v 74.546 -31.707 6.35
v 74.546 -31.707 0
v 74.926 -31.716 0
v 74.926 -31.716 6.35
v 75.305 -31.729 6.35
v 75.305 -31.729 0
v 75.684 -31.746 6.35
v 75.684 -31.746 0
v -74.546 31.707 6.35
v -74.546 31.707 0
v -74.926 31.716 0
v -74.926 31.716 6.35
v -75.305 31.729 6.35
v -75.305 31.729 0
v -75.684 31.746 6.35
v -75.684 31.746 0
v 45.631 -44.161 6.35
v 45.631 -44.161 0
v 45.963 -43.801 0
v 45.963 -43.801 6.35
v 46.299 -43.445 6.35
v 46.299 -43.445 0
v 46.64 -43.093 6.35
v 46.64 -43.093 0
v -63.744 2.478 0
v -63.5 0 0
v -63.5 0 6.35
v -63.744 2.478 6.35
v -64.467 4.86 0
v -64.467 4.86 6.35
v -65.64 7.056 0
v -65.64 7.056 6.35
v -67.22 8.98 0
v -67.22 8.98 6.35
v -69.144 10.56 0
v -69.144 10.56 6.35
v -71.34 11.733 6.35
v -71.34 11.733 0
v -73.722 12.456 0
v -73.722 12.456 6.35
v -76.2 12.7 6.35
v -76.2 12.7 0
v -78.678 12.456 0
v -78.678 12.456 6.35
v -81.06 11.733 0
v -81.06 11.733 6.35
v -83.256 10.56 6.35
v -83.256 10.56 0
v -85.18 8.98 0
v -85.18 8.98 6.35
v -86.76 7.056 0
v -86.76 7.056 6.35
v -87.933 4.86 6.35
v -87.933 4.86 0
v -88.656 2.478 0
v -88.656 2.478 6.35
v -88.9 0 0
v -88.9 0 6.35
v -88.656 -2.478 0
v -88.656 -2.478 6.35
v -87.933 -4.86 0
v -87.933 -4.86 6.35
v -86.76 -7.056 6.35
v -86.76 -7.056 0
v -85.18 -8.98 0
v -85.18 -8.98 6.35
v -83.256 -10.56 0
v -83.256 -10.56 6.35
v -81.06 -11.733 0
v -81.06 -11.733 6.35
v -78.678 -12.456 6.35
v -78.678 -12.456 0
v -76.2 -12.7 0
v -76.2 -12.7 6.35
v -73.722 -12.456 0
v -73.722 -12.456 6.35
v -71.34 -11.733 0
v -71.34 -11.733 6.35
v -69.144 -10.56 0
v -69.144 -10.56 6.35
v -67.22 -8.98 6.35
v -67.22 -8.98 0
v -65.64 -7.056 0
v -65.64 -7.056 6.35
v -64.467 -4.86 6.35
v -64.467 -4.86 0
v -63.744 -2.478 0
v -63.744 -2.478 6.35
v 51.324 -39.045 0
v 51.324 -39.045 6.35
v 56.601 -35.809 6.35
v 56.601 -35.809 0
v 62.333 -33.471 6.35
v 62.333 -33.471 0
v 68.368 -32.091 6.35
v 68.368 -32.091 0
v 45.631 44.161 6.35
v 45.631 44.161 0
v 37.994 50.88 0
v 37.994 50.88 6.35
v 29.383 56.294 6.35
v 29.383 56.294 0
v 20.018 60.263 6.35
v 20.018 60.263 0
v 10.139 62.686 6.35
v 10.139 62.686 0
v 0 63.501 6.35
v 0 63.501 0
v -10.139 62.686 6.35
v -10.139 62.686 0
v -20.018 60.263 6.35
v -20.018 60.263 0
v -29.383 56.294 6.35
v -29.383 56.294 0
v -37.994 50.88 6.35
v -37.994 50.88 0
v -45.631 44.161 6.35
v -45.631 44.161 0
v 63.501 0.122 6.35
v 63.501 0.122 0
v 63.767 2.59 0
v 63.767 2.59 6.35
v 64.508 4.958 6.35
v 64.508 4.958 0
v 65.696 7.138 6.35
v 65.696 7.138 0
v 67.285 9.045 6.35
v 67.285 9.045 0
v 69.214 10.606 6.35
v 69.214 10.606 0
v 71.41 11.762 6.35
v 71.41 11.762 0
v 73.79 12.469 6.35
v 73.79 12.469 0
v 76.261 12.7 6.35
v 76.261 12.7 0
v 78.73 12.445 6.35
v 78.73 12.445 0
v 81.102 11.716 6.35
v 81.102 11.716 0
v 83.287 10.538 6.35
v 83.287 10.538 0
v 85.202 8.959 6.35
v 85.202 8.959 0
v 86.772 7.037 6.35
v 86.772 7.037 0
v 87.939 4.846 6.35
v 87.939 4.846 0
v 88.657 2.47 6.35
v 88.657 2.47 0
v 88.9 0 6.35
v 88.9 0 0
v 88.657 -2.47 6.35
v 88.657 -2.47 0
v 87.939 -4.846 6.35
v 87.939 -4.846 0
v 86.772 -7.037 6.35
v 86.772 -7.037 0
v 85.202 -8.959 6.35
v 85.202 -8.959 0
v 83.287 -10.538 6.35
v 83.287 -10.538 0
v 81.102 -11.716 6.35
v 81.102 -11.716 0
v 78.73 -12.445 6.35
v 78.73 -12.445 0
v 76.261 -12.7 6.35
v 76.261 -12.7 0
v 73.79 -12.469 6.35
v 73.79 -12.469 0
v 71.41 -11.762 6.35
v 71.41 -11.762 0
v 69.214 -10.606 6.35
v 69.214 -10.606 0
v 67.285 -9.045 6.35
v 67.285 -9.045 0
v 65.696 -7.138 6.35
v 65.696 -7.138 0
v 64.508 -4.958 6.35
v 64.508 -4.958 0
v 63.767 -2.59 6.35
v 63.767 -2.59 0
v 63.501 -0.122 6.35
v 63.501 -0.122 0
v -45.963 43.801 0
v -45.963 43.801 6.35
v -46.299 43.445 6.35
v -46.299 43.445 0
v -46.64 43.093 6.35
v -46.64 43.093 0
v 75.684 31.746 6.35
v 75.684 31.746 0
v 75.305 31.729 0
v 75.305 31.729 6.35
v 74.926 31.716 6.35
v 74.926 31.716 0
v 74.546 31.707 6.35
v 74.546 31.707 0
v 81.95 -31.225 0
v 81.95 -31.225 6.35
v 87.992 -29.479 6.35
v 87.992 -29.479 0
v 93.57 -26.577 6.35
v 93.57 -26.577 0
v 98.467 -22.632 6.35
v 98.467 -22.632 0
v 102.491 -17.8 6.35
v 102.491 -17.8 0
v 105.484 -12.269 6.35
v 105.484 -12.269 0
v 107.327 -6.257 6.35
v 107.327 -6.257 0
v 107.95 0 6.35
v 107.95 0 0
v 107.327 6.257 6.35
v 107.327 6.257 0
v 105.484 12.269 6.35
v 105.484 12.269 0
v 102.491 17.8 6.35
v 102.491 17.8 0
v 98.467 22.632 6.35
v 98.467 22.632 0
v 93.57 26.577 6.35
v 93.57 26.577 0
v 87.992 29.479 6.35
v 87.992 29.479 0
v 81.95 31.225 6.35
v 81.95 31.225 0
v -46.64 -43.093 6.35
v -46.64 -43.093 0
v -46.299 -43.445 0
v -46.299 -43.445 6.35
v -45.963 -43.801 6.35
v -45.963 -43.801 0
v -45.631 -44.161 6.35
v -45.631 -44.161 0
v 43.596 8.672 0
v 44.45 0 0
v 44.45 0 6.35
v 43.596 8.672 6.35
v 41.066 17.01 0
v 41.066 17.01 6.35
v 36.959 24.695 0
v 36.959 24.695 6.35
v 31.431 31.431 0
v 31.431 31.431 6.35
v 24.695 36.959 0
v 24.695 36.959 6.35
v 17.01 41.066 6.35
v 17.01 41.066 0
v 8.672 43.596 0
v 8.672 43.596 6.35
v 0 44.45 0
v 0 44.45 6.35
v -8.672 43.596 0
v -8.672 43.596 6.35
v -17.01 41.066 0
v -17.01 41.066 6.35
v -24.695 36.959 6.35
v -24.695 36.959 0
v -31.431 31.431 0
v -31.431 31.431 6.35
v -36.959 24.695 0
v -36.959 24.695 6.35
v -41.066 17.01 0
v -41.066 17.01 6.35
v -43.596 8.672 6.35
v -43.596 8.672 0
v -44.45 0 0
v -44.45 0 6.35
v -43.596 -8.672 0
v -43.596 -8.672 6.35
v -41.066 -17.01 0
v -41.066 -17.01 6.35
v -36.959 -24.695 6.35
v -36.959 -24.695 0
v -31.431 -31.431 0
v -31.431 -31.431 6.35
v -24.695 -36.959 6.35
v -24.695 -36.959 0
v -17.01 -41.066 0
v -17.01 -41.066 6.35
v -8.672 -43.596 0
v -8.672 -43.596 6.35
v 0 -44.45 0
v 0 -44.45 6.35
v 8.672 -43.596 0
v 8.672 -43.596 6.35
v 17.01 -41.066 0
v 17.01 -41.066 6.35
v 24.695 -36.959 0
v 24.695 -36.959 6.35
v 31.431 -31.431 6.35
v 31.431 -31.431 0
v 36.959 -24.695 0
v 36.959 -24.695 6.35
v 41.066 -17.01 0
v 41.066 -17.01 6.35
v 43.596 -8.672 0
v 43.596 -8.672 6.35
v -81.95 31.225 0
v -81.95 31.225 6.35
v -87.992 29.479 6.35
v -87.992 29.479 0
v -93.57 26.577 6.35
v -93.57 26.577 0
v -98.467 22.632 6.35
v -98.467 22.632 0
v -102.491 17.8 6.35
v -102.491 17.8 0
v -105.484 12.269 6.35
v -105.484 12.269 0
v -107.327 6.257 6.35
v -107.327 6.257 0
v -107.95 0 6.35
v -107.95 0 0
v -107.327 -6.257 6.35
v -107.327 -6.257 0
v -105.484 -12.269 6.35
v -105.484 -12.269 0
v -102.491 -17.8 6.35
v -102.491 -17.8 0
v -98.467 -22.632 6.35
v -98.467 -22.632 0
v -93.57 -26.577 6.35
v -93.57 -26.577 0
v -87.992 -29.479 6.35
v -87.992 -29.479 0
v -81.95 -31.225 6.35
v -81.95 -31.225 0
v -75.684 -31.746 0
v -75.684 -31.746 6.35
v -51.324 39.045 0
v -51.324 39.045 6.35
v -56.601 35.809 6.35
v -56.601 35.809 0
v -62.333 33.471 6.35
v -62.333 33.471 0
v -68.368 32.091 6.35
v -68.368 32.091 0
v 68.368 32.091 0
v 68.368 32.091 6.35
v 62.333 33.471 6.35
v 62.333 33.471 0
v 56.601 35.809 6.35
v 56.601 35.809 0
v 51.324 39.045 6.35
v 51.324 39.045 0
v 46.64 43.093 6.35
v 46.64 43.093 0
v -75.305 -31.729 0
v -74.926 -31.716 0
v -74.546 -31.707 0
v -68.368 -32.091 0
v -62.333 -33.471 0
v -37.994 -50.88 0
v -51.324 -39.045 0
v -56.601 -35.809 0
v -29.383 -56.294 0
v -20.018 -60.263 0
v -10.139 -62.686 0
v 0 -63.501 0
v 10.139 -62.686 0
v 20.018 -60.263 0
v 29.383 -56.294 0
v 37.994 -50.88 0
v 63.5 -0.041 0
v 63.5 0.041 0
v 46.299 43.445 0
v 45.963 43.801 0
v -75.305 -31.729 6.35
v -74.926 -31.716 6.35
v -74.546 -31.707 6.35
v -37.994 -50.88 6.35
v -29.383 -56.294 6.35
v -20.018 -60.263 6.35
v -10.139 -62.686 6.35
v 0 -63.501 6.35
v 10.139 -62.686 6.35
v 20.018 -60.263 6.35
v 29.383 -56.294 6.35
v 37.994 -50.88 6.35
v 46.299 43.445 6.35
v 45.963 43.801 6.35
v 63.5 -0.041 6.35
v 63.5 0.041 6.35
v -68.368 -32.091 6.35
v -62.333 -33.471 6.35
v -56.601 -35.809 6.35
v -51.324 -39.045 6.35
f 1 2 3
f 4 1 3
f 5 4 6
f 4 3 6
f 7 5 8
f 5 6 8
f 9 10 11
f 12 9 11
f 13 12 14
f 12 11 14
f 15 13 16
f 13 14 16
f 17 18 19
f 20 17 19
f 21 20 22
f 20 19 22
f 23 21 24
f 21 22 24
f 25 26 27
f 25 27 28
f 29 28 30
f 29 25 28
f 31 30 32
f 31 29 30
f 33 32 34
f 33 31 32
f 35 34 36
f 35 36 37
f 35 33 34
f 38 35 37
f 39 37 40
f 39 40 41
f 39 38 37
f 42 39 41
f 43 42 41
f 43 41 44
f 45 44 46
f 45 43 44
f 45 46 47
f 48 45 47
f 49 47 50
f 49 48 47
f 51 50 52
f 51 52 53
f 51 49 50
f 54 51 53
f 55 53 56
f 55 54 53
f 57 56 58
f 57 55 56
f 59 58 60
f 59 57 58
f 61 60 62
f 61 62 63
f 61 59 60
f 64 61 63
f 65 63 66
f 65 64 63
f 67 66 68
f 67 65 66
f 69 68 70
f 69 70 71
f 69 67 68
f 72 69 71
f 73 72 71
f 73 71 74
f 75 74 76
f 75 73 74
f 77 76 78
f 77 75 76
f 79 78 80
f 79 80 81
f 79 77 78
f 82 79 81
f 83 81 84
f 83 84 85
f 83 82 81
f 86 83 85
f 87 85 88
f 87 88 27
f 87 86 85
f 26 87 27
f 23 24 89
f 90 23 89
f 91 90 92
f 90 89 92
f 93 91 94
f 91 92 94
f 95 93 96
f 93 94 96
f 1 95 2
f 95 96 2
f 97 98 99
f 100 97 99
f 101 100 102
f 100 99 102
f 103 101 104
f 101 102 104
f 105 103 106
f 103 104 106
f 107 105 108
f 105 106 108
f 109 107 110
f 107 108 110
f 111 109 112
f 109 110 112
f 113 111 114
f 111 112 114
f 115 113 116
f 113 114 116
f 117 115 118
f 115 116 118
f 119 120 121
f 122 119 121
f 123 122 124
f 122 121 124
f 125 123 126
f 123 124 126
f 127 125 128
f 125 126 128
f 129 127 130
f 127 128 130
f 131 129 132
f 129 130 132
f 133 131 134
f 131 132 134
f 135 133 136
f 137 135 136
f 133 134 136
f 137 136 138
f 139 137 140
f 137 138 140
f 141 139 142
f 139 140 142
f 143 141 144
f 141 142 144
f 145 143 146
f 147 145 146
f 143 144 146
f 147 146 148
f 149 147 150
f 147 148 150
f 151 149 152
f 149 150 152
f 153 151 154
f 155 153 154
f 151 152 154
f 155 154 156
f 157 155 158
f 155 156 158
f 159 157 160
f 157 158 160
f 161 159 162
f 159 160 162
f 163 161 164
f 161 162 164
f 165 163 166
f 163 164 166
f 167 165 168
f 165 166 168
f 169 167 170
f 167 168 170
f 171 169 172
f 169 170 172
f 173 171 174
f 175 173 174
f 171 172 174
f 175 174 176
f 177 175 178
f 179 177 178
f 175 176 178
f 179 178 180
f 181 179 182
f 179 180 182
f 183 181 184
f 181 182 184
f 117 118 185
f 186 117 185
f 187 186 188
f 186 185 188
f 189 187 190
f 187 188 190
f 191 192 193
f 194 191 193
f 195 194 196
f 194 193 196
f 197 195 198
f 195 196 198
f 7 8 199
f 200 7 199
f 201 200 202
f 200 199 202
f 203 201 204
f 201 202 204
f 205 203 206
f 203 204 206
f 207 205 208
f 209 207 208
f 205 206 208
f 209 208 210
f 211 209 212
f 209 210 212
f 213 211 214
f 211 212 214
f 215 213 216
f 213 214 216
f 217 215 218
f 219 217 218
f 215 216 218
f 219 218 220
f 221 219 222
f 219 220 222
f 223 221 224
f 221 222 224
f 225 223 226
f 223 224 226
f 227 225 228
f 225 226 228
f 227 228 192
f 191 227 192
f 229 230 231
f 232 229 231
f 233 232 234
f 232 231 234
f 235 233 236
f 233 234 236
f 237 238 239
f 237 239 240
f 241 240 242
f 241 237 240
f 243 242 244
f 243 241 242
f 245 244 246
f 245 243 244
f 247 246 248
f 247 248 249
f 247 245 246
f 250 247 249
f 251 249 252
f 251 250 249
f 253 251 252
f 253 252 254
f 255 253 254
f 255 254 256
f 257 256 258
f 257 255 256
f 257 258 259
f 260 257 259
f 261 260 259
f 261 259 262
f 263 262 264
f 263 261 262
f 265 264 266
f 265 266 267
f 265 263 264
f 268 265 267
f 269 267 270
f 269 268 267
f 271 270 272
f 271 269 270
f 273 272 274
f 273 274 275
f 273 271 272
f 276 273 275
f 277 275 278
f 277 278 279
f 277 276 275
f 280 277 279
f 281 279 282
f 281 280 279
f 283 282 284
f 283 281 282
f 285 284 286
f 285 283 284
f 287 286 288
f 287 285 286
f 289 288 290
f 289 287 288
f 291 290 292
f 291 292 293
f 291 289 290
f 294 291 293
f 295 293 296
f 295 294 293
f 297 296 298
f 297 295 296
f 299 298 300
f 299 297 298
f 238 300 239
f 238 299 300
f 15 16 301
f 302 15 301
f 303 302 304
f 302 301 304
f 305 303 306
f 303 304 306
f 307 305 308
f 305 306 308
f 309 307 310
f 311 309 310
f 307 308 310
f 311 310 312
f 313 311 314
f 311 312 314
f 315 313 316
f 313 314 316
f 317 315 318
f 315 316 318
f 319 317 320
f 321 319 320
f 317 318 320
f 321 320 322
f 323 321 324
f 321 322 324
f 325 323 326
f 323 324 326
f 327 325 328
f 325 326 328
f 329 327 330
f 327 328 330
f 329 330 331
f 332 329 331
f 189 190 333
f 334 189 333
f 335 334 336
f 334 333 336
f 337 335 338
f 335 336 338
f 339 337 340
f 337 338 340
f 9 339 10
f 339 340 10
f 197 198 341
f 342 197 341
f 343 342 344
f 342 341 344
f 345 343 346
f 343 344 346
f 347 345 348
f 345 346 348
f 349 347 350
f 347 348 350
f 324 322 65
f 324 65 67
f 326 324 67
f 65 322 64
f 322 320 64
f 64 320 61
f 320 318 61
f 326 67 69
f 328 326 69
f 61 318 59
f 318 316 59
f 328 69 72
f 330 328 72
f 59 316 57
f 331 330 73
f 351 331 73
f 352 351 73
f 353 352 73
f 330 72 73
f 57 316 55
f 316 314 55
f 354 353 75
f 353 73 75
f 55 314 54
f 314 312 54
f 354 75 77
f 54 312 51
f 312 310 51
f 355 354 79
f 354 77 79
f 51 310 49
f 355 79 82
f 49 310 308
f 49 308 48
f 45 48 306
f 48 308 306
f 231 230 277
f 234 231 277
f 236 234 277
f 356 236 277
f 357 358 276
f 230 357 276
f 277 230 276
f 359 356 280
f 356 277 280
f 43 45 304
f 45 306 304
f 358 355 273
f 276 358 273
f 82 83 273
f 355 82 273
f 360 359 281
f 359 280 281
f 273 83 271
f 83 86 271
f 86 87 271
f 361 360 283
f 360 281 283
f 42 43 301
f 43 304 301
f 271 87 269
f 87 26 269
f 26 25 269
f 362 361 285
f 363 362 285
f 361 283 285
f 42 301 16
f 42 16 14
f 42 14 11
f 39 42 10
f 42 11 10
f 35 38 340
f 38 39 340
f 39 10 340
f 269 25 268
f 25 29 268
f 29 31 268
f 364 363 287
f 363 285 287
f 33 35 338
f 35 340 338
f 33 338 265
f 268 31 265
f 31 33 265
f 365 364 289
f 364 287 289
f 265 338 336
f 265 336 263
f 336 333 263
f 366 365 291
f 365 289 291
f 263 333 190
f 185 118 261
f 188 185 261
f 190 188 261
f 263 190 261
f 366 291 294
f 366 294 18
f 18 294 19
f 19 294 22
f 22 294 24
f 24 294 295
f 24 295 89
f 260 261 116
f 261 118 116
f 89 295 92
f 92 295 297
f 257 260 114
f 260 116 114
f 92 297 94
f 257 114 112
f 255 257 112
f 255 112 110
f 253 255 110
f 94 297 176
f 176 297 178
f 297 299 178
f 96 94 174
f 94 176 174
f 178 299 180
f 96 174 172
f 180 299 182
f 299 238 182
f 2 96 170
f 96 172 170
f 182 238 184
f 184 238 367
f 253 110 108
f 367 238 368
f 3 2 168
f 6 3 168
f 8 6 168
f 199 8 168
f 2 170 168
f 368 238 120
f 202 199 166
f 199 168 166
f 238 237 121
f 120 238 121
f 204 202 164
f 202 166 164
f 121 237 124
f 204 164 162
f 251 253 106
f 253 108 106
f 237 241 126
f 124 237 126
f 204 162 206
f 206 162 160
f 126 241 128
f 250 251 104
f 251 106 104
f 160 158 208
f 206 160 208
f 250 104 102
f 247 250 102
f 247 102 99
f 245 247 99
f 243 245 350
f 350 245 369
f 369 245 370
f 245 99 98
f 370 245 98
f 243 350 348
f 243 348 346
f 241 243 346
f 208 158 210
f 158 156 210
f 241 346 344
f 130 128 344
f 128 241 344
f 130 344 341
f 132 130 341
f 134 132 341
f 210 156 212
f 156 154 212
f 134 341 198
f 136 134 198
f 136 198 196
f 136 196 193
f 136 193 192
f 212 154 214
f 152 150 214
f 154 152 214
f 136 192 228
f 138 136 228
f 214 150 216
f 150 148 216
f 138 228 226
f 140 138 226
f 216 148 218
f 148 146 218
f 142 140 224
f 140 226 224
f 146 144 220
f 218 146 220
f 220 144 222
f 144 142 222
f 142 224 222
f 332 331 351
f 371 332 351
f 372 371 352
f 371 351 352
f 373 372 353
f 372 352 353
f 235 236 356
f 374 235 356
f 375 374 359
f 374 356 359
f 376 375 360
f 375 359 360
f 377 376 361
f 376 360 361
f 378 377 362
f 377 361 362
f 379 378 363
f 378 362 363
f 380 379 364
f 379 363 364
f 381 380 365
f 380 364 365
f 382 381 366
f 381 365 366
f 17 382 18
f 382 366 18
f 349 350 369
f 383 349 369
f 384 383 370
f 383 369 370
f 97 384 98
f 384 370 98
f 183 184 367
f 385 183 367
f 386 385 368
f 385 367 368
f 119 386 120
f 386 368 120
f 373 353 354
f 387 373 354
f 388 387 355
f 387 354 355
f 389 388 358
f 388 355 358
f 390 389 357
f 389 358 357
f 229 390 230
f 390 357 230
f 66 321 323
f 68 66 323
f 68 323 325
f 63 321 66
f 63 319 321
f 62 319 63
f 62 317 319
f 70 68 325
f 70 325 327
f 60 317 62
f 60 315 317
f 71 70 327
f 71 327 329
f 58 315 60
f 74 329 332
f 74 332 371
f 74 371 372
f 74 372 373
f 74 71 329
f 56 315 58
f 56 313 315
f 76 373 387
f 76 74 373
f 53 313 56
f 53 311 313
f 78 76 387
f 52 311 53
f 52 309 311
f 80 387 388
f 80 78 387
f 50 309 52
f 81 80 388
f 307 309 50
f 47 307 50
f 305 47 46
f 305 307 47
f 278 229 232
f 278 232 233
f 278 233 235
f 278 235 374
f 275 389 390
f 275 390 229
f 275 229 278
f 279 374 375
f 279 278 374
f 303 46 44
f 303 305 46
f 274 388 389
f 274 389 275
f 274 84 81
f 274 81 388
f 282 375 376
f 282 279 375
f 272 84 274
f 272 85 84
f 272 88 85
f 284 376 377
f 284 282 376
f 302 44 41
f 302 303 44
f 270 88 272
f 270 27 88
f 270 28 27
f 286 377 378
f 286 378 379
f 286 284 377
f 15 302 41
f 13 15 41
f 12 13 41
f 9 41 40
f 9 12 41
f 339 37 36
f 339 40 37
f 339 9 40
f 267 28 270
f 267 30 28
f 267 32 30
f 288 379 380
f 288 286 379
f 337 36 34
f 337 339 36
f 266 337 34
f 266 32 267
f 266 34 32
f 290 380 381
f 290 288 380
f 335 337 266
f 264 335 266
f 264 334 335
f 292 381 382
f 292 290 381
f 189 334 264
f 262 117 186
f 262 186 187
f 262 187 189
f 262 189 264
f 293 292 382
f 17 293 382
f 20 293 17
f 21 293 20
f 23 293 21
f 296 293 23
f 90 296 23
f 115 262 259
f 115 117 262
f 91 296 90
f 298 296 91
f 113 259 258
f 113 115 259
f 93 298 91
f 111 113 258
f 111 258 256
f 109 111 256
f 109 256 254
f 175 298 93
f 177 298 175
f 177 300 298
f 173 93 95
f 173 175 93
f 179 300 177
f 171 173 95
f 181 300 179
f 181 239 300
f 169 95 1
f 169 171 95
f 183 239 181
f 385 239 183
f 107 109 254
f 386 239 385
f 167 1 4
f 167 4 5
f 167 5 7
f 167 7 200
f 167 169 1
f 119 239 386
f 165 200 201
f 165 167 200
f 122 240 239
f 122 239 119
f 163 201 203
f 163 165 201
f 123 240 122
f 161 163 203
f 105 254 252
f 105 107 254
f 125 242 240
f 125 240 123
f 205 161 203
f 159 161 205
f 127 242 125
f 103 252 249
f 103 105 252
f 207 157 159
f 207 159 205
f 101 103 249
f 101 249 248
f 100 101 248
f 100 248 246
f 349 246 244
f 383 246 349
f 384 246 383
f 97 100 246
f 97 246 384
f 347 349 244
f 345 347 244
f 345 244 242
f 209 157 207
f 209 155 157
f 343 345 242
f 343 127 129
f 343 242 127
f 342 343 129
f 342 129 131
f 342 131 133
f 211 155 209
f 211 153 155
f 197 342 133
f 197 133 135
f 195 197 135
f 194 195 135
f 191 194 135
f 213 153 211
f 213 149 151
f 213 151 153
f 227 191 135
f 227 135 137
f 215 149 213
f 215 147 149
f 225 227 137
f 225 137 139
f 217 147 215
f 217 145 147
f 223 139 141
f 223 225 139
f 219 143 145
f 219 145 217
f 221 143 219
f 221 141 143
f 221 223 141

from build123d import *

# Parameters (mm, degrees)
F0_R     = 12.7
F0_R_2   = 44.45
F1_DEPTH = 6.35


# Not quite as in the source:
# - a length typed as a fraction of an inch, garbled in the dataset ("3 / 203.2 mm" for 3/8 in), is restored


with BuildPart() as f1:
    # F0 (on Top) → F1 (new body)
    with BuildSketch(Plane.XY):
        with BuildLine():
            ThreePointArc((-74.5464027897, -31.7069095982), (-59.4196204119, -34.5232781397), (-46.6403597532, -43.0931074194))
            ThreePointArc((-46.6403597532, -43.0931074194), (-46.1303112619, -43.6221670242), (-45.6305618227, -44.160965713))
            ThreePointArc((-45.6305618227, -44.160965713), (0, -63.500701295), (45.6305618227, -44.160965713))
            ThreePointArc((45.6305618227, -44.160965713), (46.1303112619, -43.6221670242), (46.6403597532, -43.0931074194))
            ThreePointArc((46.6403597532, -43.0931074194), (59.4196204119, -34.5232781397), (74.5464027897, -31.7069095982))
            ThreePointArc((74.5464027897, -31.7069095982), (75.115235957, -31.7221094671), (75.6837786723, -31.745803117))
            ThreePointArc((75.6837786723, -31.745803117), (107.95, 0), (75.6837786723, 31.745803117))
            ThreePointArc((75.6837786723, 31.745803117), (75.115235957, 31.7221094671), (74.5464027897, 31.7069095982))
            ThreePointArc((74.5464027897, 31.7069095982), (59.4196204119, 34.5232781397), (46.6403597532, 43.0931074194))
            ThreePointArc((46.6403597532, 43.0931074194), (46.1303112619, 43.6221670242), (45.6305618227, 44.160965713))
            ThreePointArc((45.6305618227, 44.160965713), (0, 63.500701295), (-45.6305618227, 44.160965713))
            ThreePointArc((-45.6305618227, 44.160965713), (-46.1303112619, 43.6221670242), (-46.6403597532, 43.0931074194))
            ThreePointArc((-46.6403597532, 43.0931074194), (-59.4196204119, 34.5232781397), (-74.5464027897, 31.7069095982))
            ThreePointArc((-74.5464027897, 31.7069095982), (-75.115235957, 31.7221094671), (-75.6837786723, 31.745803117))
            ThreePointArc((-75.6837786723, 31.745803117), (-107.95, 0), (-75.6837786723, -31.745803117))
            ThreePointArc((-75.6837786723, -31.745803117), (-75.115235957, -31.7221094671), (-74.5464027897, -31.7069095982))
        make_face()
        with Locations((-76.2, 0)):
            Circle(F0_R, mode=Mode.SUBTRACT)
        Circle(F0_R_2, mode=Mode.SUBTRACT)
        with BuildLine():
            ThreePointArc((63.5005844158, 0.1218352114), (76.2609183065, 12.6998538952), (88.9, 0))
            ThreePointArc((88.9, 0), (76.2609183065, -12.6998538952), (63.5005844158, -0.1218352114))
            ThreePointArc((63.5005844158, -0.1218352114), (63.5, 0), (63.5005844158, 0.1218352114))
        make_face(mode=Mode.SUBTRACT)
    extrude(amount=F1_DEPTH)


solid = f1.part
